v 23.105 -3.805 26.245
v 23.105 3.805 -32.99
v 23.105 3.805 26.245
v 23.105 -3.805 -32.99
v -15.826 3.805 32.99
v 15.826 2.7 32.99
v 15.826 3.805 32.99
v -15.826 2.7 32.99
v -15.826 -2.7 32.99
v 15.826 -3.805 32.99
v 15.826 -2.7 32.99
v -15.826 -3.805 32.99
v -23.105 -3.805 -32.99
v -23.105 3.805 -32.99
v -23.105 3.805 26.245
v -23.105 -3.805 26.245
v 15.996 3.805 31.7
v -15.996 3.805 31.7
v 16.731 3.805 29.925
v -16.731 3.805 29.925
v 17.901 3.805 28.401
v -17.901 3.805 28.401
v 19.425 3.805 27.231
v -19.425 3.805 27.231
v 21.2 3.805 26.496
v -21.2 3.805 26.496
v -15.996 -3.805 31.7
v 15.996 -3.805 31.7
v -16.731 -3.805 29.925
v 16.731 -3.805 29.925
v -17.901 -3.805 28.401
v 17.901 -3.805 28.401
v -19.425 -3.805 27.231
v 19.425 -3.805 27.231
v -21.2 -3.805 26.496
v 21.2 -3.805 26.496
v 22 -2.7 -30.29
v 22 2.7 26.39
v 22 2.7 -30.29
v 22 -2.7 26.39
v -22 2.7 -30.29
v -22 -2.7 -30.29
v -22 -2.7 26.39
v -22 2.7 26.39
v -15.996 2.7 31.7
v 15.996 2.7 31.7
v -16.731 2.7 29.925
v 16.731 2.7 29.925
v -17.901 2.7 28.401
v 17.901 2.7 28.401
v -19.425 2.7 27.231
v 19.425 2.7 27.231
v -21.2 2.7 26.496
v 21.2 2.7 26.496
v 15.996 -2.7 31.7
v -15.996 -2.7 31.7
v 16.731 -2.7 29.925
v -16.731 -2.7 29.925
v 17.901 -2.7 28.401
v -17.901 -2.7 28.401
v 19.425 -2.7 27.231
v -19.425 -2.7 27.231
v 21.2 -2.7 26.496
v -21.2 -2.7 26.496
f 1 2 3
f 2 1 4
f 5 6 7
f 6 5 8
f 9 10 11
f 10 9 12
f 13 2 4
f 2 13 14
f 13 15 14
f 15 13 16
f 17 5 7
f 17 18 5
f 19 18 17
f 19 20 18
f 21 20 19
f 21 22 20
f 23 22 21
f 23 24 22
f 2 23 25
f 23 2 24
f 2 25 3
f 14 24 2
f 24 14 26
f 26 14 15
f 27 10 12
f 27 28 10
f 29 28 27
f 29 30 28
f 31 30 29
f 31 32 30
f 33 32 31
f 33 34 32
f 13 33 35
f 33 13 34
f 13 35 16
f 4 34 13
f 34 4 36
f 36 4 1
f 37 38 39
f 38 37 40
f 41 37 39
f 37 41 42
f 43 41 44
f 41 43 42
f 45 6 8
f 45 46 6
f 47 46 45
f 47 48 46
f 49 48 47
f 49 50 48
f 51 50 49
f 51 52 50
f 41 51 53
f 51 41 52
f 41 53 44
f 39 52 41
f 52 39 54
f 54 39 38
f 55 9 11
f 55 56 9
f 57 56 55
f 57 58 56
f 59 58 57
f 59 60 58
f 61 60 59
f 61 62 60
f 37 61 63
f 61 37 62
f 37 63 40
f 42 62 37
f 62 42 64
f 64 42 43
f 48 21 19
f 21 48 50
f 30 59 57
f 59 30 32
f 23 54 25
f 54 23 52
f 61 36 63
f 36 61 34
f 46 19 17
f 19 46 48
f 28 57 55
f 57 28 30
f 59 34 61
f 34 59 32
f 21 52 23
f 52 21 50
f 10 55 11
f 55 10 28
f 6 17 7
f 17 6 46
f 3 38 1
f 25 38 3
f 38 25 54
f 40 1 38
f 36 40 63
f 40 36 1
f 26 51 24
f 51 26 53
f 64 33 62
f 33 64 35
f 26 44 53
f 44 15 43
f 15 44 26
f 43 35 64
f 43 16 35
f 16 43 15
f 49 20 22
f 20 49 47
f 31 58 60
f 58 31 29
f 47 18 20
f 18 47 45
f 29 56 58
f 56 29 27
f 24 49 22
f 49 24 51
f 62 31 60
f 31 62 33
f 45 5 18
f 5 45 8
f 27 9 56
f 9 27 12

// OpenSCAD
/*
Parametric Cell Phone Battery holder. 

Case to hold a spare battery without fear of shorting it out.

Created by Mike Creuzer - Mike@Creuzer.com - 20120816
*/

// Battery dimensions in mm
// Internal height
height = 65;
// Internal Width
width  = 44;
// Internal narrow bit
depth  = 5.4;

// Print Settings in mm
// Looking at the gcode of a sliced file often times tells you this at the top of the file
singleWallWidth = .49; 
// Number of walls you want
thickness          = 2; 
// how much added 'slop' you want so the case is easier to use.
clearence          = .25; 




difference()
{
	cube(size = [width + 2*thickness*singleWallWidth + clearence, depth + 2*thickness*singleWallWidth + clearence, height + thickness*singleWallWidth], center=true);

	translate([0,0,2*thickness*singleWallWidth + clearence]) cube(size = [width,depth, height], center=true);
	translate([.5*(width + 2*thickness*singleWallWidth + clearence),0,.5 * (height + 2*thickness*singleWallWidth + clearence)]) rotate([90,0,0]) cylinder(r = depth + 2*thickness*singleWallWidth, h=depth + 2*thickness*singleWallWidth + clearence, center=true);
	translate([-.5*(width + 2*thickness*singleWallWidth + clearence),0,.5 * (height + 2*thickness*singleWallWidth + clearence)]) rotate([90,0,0]) cylinder(r = depth + 2*thickness*singleWallWidth, h=depth + 2*thickness*singleWallWidth + clearence, center=true);

}
